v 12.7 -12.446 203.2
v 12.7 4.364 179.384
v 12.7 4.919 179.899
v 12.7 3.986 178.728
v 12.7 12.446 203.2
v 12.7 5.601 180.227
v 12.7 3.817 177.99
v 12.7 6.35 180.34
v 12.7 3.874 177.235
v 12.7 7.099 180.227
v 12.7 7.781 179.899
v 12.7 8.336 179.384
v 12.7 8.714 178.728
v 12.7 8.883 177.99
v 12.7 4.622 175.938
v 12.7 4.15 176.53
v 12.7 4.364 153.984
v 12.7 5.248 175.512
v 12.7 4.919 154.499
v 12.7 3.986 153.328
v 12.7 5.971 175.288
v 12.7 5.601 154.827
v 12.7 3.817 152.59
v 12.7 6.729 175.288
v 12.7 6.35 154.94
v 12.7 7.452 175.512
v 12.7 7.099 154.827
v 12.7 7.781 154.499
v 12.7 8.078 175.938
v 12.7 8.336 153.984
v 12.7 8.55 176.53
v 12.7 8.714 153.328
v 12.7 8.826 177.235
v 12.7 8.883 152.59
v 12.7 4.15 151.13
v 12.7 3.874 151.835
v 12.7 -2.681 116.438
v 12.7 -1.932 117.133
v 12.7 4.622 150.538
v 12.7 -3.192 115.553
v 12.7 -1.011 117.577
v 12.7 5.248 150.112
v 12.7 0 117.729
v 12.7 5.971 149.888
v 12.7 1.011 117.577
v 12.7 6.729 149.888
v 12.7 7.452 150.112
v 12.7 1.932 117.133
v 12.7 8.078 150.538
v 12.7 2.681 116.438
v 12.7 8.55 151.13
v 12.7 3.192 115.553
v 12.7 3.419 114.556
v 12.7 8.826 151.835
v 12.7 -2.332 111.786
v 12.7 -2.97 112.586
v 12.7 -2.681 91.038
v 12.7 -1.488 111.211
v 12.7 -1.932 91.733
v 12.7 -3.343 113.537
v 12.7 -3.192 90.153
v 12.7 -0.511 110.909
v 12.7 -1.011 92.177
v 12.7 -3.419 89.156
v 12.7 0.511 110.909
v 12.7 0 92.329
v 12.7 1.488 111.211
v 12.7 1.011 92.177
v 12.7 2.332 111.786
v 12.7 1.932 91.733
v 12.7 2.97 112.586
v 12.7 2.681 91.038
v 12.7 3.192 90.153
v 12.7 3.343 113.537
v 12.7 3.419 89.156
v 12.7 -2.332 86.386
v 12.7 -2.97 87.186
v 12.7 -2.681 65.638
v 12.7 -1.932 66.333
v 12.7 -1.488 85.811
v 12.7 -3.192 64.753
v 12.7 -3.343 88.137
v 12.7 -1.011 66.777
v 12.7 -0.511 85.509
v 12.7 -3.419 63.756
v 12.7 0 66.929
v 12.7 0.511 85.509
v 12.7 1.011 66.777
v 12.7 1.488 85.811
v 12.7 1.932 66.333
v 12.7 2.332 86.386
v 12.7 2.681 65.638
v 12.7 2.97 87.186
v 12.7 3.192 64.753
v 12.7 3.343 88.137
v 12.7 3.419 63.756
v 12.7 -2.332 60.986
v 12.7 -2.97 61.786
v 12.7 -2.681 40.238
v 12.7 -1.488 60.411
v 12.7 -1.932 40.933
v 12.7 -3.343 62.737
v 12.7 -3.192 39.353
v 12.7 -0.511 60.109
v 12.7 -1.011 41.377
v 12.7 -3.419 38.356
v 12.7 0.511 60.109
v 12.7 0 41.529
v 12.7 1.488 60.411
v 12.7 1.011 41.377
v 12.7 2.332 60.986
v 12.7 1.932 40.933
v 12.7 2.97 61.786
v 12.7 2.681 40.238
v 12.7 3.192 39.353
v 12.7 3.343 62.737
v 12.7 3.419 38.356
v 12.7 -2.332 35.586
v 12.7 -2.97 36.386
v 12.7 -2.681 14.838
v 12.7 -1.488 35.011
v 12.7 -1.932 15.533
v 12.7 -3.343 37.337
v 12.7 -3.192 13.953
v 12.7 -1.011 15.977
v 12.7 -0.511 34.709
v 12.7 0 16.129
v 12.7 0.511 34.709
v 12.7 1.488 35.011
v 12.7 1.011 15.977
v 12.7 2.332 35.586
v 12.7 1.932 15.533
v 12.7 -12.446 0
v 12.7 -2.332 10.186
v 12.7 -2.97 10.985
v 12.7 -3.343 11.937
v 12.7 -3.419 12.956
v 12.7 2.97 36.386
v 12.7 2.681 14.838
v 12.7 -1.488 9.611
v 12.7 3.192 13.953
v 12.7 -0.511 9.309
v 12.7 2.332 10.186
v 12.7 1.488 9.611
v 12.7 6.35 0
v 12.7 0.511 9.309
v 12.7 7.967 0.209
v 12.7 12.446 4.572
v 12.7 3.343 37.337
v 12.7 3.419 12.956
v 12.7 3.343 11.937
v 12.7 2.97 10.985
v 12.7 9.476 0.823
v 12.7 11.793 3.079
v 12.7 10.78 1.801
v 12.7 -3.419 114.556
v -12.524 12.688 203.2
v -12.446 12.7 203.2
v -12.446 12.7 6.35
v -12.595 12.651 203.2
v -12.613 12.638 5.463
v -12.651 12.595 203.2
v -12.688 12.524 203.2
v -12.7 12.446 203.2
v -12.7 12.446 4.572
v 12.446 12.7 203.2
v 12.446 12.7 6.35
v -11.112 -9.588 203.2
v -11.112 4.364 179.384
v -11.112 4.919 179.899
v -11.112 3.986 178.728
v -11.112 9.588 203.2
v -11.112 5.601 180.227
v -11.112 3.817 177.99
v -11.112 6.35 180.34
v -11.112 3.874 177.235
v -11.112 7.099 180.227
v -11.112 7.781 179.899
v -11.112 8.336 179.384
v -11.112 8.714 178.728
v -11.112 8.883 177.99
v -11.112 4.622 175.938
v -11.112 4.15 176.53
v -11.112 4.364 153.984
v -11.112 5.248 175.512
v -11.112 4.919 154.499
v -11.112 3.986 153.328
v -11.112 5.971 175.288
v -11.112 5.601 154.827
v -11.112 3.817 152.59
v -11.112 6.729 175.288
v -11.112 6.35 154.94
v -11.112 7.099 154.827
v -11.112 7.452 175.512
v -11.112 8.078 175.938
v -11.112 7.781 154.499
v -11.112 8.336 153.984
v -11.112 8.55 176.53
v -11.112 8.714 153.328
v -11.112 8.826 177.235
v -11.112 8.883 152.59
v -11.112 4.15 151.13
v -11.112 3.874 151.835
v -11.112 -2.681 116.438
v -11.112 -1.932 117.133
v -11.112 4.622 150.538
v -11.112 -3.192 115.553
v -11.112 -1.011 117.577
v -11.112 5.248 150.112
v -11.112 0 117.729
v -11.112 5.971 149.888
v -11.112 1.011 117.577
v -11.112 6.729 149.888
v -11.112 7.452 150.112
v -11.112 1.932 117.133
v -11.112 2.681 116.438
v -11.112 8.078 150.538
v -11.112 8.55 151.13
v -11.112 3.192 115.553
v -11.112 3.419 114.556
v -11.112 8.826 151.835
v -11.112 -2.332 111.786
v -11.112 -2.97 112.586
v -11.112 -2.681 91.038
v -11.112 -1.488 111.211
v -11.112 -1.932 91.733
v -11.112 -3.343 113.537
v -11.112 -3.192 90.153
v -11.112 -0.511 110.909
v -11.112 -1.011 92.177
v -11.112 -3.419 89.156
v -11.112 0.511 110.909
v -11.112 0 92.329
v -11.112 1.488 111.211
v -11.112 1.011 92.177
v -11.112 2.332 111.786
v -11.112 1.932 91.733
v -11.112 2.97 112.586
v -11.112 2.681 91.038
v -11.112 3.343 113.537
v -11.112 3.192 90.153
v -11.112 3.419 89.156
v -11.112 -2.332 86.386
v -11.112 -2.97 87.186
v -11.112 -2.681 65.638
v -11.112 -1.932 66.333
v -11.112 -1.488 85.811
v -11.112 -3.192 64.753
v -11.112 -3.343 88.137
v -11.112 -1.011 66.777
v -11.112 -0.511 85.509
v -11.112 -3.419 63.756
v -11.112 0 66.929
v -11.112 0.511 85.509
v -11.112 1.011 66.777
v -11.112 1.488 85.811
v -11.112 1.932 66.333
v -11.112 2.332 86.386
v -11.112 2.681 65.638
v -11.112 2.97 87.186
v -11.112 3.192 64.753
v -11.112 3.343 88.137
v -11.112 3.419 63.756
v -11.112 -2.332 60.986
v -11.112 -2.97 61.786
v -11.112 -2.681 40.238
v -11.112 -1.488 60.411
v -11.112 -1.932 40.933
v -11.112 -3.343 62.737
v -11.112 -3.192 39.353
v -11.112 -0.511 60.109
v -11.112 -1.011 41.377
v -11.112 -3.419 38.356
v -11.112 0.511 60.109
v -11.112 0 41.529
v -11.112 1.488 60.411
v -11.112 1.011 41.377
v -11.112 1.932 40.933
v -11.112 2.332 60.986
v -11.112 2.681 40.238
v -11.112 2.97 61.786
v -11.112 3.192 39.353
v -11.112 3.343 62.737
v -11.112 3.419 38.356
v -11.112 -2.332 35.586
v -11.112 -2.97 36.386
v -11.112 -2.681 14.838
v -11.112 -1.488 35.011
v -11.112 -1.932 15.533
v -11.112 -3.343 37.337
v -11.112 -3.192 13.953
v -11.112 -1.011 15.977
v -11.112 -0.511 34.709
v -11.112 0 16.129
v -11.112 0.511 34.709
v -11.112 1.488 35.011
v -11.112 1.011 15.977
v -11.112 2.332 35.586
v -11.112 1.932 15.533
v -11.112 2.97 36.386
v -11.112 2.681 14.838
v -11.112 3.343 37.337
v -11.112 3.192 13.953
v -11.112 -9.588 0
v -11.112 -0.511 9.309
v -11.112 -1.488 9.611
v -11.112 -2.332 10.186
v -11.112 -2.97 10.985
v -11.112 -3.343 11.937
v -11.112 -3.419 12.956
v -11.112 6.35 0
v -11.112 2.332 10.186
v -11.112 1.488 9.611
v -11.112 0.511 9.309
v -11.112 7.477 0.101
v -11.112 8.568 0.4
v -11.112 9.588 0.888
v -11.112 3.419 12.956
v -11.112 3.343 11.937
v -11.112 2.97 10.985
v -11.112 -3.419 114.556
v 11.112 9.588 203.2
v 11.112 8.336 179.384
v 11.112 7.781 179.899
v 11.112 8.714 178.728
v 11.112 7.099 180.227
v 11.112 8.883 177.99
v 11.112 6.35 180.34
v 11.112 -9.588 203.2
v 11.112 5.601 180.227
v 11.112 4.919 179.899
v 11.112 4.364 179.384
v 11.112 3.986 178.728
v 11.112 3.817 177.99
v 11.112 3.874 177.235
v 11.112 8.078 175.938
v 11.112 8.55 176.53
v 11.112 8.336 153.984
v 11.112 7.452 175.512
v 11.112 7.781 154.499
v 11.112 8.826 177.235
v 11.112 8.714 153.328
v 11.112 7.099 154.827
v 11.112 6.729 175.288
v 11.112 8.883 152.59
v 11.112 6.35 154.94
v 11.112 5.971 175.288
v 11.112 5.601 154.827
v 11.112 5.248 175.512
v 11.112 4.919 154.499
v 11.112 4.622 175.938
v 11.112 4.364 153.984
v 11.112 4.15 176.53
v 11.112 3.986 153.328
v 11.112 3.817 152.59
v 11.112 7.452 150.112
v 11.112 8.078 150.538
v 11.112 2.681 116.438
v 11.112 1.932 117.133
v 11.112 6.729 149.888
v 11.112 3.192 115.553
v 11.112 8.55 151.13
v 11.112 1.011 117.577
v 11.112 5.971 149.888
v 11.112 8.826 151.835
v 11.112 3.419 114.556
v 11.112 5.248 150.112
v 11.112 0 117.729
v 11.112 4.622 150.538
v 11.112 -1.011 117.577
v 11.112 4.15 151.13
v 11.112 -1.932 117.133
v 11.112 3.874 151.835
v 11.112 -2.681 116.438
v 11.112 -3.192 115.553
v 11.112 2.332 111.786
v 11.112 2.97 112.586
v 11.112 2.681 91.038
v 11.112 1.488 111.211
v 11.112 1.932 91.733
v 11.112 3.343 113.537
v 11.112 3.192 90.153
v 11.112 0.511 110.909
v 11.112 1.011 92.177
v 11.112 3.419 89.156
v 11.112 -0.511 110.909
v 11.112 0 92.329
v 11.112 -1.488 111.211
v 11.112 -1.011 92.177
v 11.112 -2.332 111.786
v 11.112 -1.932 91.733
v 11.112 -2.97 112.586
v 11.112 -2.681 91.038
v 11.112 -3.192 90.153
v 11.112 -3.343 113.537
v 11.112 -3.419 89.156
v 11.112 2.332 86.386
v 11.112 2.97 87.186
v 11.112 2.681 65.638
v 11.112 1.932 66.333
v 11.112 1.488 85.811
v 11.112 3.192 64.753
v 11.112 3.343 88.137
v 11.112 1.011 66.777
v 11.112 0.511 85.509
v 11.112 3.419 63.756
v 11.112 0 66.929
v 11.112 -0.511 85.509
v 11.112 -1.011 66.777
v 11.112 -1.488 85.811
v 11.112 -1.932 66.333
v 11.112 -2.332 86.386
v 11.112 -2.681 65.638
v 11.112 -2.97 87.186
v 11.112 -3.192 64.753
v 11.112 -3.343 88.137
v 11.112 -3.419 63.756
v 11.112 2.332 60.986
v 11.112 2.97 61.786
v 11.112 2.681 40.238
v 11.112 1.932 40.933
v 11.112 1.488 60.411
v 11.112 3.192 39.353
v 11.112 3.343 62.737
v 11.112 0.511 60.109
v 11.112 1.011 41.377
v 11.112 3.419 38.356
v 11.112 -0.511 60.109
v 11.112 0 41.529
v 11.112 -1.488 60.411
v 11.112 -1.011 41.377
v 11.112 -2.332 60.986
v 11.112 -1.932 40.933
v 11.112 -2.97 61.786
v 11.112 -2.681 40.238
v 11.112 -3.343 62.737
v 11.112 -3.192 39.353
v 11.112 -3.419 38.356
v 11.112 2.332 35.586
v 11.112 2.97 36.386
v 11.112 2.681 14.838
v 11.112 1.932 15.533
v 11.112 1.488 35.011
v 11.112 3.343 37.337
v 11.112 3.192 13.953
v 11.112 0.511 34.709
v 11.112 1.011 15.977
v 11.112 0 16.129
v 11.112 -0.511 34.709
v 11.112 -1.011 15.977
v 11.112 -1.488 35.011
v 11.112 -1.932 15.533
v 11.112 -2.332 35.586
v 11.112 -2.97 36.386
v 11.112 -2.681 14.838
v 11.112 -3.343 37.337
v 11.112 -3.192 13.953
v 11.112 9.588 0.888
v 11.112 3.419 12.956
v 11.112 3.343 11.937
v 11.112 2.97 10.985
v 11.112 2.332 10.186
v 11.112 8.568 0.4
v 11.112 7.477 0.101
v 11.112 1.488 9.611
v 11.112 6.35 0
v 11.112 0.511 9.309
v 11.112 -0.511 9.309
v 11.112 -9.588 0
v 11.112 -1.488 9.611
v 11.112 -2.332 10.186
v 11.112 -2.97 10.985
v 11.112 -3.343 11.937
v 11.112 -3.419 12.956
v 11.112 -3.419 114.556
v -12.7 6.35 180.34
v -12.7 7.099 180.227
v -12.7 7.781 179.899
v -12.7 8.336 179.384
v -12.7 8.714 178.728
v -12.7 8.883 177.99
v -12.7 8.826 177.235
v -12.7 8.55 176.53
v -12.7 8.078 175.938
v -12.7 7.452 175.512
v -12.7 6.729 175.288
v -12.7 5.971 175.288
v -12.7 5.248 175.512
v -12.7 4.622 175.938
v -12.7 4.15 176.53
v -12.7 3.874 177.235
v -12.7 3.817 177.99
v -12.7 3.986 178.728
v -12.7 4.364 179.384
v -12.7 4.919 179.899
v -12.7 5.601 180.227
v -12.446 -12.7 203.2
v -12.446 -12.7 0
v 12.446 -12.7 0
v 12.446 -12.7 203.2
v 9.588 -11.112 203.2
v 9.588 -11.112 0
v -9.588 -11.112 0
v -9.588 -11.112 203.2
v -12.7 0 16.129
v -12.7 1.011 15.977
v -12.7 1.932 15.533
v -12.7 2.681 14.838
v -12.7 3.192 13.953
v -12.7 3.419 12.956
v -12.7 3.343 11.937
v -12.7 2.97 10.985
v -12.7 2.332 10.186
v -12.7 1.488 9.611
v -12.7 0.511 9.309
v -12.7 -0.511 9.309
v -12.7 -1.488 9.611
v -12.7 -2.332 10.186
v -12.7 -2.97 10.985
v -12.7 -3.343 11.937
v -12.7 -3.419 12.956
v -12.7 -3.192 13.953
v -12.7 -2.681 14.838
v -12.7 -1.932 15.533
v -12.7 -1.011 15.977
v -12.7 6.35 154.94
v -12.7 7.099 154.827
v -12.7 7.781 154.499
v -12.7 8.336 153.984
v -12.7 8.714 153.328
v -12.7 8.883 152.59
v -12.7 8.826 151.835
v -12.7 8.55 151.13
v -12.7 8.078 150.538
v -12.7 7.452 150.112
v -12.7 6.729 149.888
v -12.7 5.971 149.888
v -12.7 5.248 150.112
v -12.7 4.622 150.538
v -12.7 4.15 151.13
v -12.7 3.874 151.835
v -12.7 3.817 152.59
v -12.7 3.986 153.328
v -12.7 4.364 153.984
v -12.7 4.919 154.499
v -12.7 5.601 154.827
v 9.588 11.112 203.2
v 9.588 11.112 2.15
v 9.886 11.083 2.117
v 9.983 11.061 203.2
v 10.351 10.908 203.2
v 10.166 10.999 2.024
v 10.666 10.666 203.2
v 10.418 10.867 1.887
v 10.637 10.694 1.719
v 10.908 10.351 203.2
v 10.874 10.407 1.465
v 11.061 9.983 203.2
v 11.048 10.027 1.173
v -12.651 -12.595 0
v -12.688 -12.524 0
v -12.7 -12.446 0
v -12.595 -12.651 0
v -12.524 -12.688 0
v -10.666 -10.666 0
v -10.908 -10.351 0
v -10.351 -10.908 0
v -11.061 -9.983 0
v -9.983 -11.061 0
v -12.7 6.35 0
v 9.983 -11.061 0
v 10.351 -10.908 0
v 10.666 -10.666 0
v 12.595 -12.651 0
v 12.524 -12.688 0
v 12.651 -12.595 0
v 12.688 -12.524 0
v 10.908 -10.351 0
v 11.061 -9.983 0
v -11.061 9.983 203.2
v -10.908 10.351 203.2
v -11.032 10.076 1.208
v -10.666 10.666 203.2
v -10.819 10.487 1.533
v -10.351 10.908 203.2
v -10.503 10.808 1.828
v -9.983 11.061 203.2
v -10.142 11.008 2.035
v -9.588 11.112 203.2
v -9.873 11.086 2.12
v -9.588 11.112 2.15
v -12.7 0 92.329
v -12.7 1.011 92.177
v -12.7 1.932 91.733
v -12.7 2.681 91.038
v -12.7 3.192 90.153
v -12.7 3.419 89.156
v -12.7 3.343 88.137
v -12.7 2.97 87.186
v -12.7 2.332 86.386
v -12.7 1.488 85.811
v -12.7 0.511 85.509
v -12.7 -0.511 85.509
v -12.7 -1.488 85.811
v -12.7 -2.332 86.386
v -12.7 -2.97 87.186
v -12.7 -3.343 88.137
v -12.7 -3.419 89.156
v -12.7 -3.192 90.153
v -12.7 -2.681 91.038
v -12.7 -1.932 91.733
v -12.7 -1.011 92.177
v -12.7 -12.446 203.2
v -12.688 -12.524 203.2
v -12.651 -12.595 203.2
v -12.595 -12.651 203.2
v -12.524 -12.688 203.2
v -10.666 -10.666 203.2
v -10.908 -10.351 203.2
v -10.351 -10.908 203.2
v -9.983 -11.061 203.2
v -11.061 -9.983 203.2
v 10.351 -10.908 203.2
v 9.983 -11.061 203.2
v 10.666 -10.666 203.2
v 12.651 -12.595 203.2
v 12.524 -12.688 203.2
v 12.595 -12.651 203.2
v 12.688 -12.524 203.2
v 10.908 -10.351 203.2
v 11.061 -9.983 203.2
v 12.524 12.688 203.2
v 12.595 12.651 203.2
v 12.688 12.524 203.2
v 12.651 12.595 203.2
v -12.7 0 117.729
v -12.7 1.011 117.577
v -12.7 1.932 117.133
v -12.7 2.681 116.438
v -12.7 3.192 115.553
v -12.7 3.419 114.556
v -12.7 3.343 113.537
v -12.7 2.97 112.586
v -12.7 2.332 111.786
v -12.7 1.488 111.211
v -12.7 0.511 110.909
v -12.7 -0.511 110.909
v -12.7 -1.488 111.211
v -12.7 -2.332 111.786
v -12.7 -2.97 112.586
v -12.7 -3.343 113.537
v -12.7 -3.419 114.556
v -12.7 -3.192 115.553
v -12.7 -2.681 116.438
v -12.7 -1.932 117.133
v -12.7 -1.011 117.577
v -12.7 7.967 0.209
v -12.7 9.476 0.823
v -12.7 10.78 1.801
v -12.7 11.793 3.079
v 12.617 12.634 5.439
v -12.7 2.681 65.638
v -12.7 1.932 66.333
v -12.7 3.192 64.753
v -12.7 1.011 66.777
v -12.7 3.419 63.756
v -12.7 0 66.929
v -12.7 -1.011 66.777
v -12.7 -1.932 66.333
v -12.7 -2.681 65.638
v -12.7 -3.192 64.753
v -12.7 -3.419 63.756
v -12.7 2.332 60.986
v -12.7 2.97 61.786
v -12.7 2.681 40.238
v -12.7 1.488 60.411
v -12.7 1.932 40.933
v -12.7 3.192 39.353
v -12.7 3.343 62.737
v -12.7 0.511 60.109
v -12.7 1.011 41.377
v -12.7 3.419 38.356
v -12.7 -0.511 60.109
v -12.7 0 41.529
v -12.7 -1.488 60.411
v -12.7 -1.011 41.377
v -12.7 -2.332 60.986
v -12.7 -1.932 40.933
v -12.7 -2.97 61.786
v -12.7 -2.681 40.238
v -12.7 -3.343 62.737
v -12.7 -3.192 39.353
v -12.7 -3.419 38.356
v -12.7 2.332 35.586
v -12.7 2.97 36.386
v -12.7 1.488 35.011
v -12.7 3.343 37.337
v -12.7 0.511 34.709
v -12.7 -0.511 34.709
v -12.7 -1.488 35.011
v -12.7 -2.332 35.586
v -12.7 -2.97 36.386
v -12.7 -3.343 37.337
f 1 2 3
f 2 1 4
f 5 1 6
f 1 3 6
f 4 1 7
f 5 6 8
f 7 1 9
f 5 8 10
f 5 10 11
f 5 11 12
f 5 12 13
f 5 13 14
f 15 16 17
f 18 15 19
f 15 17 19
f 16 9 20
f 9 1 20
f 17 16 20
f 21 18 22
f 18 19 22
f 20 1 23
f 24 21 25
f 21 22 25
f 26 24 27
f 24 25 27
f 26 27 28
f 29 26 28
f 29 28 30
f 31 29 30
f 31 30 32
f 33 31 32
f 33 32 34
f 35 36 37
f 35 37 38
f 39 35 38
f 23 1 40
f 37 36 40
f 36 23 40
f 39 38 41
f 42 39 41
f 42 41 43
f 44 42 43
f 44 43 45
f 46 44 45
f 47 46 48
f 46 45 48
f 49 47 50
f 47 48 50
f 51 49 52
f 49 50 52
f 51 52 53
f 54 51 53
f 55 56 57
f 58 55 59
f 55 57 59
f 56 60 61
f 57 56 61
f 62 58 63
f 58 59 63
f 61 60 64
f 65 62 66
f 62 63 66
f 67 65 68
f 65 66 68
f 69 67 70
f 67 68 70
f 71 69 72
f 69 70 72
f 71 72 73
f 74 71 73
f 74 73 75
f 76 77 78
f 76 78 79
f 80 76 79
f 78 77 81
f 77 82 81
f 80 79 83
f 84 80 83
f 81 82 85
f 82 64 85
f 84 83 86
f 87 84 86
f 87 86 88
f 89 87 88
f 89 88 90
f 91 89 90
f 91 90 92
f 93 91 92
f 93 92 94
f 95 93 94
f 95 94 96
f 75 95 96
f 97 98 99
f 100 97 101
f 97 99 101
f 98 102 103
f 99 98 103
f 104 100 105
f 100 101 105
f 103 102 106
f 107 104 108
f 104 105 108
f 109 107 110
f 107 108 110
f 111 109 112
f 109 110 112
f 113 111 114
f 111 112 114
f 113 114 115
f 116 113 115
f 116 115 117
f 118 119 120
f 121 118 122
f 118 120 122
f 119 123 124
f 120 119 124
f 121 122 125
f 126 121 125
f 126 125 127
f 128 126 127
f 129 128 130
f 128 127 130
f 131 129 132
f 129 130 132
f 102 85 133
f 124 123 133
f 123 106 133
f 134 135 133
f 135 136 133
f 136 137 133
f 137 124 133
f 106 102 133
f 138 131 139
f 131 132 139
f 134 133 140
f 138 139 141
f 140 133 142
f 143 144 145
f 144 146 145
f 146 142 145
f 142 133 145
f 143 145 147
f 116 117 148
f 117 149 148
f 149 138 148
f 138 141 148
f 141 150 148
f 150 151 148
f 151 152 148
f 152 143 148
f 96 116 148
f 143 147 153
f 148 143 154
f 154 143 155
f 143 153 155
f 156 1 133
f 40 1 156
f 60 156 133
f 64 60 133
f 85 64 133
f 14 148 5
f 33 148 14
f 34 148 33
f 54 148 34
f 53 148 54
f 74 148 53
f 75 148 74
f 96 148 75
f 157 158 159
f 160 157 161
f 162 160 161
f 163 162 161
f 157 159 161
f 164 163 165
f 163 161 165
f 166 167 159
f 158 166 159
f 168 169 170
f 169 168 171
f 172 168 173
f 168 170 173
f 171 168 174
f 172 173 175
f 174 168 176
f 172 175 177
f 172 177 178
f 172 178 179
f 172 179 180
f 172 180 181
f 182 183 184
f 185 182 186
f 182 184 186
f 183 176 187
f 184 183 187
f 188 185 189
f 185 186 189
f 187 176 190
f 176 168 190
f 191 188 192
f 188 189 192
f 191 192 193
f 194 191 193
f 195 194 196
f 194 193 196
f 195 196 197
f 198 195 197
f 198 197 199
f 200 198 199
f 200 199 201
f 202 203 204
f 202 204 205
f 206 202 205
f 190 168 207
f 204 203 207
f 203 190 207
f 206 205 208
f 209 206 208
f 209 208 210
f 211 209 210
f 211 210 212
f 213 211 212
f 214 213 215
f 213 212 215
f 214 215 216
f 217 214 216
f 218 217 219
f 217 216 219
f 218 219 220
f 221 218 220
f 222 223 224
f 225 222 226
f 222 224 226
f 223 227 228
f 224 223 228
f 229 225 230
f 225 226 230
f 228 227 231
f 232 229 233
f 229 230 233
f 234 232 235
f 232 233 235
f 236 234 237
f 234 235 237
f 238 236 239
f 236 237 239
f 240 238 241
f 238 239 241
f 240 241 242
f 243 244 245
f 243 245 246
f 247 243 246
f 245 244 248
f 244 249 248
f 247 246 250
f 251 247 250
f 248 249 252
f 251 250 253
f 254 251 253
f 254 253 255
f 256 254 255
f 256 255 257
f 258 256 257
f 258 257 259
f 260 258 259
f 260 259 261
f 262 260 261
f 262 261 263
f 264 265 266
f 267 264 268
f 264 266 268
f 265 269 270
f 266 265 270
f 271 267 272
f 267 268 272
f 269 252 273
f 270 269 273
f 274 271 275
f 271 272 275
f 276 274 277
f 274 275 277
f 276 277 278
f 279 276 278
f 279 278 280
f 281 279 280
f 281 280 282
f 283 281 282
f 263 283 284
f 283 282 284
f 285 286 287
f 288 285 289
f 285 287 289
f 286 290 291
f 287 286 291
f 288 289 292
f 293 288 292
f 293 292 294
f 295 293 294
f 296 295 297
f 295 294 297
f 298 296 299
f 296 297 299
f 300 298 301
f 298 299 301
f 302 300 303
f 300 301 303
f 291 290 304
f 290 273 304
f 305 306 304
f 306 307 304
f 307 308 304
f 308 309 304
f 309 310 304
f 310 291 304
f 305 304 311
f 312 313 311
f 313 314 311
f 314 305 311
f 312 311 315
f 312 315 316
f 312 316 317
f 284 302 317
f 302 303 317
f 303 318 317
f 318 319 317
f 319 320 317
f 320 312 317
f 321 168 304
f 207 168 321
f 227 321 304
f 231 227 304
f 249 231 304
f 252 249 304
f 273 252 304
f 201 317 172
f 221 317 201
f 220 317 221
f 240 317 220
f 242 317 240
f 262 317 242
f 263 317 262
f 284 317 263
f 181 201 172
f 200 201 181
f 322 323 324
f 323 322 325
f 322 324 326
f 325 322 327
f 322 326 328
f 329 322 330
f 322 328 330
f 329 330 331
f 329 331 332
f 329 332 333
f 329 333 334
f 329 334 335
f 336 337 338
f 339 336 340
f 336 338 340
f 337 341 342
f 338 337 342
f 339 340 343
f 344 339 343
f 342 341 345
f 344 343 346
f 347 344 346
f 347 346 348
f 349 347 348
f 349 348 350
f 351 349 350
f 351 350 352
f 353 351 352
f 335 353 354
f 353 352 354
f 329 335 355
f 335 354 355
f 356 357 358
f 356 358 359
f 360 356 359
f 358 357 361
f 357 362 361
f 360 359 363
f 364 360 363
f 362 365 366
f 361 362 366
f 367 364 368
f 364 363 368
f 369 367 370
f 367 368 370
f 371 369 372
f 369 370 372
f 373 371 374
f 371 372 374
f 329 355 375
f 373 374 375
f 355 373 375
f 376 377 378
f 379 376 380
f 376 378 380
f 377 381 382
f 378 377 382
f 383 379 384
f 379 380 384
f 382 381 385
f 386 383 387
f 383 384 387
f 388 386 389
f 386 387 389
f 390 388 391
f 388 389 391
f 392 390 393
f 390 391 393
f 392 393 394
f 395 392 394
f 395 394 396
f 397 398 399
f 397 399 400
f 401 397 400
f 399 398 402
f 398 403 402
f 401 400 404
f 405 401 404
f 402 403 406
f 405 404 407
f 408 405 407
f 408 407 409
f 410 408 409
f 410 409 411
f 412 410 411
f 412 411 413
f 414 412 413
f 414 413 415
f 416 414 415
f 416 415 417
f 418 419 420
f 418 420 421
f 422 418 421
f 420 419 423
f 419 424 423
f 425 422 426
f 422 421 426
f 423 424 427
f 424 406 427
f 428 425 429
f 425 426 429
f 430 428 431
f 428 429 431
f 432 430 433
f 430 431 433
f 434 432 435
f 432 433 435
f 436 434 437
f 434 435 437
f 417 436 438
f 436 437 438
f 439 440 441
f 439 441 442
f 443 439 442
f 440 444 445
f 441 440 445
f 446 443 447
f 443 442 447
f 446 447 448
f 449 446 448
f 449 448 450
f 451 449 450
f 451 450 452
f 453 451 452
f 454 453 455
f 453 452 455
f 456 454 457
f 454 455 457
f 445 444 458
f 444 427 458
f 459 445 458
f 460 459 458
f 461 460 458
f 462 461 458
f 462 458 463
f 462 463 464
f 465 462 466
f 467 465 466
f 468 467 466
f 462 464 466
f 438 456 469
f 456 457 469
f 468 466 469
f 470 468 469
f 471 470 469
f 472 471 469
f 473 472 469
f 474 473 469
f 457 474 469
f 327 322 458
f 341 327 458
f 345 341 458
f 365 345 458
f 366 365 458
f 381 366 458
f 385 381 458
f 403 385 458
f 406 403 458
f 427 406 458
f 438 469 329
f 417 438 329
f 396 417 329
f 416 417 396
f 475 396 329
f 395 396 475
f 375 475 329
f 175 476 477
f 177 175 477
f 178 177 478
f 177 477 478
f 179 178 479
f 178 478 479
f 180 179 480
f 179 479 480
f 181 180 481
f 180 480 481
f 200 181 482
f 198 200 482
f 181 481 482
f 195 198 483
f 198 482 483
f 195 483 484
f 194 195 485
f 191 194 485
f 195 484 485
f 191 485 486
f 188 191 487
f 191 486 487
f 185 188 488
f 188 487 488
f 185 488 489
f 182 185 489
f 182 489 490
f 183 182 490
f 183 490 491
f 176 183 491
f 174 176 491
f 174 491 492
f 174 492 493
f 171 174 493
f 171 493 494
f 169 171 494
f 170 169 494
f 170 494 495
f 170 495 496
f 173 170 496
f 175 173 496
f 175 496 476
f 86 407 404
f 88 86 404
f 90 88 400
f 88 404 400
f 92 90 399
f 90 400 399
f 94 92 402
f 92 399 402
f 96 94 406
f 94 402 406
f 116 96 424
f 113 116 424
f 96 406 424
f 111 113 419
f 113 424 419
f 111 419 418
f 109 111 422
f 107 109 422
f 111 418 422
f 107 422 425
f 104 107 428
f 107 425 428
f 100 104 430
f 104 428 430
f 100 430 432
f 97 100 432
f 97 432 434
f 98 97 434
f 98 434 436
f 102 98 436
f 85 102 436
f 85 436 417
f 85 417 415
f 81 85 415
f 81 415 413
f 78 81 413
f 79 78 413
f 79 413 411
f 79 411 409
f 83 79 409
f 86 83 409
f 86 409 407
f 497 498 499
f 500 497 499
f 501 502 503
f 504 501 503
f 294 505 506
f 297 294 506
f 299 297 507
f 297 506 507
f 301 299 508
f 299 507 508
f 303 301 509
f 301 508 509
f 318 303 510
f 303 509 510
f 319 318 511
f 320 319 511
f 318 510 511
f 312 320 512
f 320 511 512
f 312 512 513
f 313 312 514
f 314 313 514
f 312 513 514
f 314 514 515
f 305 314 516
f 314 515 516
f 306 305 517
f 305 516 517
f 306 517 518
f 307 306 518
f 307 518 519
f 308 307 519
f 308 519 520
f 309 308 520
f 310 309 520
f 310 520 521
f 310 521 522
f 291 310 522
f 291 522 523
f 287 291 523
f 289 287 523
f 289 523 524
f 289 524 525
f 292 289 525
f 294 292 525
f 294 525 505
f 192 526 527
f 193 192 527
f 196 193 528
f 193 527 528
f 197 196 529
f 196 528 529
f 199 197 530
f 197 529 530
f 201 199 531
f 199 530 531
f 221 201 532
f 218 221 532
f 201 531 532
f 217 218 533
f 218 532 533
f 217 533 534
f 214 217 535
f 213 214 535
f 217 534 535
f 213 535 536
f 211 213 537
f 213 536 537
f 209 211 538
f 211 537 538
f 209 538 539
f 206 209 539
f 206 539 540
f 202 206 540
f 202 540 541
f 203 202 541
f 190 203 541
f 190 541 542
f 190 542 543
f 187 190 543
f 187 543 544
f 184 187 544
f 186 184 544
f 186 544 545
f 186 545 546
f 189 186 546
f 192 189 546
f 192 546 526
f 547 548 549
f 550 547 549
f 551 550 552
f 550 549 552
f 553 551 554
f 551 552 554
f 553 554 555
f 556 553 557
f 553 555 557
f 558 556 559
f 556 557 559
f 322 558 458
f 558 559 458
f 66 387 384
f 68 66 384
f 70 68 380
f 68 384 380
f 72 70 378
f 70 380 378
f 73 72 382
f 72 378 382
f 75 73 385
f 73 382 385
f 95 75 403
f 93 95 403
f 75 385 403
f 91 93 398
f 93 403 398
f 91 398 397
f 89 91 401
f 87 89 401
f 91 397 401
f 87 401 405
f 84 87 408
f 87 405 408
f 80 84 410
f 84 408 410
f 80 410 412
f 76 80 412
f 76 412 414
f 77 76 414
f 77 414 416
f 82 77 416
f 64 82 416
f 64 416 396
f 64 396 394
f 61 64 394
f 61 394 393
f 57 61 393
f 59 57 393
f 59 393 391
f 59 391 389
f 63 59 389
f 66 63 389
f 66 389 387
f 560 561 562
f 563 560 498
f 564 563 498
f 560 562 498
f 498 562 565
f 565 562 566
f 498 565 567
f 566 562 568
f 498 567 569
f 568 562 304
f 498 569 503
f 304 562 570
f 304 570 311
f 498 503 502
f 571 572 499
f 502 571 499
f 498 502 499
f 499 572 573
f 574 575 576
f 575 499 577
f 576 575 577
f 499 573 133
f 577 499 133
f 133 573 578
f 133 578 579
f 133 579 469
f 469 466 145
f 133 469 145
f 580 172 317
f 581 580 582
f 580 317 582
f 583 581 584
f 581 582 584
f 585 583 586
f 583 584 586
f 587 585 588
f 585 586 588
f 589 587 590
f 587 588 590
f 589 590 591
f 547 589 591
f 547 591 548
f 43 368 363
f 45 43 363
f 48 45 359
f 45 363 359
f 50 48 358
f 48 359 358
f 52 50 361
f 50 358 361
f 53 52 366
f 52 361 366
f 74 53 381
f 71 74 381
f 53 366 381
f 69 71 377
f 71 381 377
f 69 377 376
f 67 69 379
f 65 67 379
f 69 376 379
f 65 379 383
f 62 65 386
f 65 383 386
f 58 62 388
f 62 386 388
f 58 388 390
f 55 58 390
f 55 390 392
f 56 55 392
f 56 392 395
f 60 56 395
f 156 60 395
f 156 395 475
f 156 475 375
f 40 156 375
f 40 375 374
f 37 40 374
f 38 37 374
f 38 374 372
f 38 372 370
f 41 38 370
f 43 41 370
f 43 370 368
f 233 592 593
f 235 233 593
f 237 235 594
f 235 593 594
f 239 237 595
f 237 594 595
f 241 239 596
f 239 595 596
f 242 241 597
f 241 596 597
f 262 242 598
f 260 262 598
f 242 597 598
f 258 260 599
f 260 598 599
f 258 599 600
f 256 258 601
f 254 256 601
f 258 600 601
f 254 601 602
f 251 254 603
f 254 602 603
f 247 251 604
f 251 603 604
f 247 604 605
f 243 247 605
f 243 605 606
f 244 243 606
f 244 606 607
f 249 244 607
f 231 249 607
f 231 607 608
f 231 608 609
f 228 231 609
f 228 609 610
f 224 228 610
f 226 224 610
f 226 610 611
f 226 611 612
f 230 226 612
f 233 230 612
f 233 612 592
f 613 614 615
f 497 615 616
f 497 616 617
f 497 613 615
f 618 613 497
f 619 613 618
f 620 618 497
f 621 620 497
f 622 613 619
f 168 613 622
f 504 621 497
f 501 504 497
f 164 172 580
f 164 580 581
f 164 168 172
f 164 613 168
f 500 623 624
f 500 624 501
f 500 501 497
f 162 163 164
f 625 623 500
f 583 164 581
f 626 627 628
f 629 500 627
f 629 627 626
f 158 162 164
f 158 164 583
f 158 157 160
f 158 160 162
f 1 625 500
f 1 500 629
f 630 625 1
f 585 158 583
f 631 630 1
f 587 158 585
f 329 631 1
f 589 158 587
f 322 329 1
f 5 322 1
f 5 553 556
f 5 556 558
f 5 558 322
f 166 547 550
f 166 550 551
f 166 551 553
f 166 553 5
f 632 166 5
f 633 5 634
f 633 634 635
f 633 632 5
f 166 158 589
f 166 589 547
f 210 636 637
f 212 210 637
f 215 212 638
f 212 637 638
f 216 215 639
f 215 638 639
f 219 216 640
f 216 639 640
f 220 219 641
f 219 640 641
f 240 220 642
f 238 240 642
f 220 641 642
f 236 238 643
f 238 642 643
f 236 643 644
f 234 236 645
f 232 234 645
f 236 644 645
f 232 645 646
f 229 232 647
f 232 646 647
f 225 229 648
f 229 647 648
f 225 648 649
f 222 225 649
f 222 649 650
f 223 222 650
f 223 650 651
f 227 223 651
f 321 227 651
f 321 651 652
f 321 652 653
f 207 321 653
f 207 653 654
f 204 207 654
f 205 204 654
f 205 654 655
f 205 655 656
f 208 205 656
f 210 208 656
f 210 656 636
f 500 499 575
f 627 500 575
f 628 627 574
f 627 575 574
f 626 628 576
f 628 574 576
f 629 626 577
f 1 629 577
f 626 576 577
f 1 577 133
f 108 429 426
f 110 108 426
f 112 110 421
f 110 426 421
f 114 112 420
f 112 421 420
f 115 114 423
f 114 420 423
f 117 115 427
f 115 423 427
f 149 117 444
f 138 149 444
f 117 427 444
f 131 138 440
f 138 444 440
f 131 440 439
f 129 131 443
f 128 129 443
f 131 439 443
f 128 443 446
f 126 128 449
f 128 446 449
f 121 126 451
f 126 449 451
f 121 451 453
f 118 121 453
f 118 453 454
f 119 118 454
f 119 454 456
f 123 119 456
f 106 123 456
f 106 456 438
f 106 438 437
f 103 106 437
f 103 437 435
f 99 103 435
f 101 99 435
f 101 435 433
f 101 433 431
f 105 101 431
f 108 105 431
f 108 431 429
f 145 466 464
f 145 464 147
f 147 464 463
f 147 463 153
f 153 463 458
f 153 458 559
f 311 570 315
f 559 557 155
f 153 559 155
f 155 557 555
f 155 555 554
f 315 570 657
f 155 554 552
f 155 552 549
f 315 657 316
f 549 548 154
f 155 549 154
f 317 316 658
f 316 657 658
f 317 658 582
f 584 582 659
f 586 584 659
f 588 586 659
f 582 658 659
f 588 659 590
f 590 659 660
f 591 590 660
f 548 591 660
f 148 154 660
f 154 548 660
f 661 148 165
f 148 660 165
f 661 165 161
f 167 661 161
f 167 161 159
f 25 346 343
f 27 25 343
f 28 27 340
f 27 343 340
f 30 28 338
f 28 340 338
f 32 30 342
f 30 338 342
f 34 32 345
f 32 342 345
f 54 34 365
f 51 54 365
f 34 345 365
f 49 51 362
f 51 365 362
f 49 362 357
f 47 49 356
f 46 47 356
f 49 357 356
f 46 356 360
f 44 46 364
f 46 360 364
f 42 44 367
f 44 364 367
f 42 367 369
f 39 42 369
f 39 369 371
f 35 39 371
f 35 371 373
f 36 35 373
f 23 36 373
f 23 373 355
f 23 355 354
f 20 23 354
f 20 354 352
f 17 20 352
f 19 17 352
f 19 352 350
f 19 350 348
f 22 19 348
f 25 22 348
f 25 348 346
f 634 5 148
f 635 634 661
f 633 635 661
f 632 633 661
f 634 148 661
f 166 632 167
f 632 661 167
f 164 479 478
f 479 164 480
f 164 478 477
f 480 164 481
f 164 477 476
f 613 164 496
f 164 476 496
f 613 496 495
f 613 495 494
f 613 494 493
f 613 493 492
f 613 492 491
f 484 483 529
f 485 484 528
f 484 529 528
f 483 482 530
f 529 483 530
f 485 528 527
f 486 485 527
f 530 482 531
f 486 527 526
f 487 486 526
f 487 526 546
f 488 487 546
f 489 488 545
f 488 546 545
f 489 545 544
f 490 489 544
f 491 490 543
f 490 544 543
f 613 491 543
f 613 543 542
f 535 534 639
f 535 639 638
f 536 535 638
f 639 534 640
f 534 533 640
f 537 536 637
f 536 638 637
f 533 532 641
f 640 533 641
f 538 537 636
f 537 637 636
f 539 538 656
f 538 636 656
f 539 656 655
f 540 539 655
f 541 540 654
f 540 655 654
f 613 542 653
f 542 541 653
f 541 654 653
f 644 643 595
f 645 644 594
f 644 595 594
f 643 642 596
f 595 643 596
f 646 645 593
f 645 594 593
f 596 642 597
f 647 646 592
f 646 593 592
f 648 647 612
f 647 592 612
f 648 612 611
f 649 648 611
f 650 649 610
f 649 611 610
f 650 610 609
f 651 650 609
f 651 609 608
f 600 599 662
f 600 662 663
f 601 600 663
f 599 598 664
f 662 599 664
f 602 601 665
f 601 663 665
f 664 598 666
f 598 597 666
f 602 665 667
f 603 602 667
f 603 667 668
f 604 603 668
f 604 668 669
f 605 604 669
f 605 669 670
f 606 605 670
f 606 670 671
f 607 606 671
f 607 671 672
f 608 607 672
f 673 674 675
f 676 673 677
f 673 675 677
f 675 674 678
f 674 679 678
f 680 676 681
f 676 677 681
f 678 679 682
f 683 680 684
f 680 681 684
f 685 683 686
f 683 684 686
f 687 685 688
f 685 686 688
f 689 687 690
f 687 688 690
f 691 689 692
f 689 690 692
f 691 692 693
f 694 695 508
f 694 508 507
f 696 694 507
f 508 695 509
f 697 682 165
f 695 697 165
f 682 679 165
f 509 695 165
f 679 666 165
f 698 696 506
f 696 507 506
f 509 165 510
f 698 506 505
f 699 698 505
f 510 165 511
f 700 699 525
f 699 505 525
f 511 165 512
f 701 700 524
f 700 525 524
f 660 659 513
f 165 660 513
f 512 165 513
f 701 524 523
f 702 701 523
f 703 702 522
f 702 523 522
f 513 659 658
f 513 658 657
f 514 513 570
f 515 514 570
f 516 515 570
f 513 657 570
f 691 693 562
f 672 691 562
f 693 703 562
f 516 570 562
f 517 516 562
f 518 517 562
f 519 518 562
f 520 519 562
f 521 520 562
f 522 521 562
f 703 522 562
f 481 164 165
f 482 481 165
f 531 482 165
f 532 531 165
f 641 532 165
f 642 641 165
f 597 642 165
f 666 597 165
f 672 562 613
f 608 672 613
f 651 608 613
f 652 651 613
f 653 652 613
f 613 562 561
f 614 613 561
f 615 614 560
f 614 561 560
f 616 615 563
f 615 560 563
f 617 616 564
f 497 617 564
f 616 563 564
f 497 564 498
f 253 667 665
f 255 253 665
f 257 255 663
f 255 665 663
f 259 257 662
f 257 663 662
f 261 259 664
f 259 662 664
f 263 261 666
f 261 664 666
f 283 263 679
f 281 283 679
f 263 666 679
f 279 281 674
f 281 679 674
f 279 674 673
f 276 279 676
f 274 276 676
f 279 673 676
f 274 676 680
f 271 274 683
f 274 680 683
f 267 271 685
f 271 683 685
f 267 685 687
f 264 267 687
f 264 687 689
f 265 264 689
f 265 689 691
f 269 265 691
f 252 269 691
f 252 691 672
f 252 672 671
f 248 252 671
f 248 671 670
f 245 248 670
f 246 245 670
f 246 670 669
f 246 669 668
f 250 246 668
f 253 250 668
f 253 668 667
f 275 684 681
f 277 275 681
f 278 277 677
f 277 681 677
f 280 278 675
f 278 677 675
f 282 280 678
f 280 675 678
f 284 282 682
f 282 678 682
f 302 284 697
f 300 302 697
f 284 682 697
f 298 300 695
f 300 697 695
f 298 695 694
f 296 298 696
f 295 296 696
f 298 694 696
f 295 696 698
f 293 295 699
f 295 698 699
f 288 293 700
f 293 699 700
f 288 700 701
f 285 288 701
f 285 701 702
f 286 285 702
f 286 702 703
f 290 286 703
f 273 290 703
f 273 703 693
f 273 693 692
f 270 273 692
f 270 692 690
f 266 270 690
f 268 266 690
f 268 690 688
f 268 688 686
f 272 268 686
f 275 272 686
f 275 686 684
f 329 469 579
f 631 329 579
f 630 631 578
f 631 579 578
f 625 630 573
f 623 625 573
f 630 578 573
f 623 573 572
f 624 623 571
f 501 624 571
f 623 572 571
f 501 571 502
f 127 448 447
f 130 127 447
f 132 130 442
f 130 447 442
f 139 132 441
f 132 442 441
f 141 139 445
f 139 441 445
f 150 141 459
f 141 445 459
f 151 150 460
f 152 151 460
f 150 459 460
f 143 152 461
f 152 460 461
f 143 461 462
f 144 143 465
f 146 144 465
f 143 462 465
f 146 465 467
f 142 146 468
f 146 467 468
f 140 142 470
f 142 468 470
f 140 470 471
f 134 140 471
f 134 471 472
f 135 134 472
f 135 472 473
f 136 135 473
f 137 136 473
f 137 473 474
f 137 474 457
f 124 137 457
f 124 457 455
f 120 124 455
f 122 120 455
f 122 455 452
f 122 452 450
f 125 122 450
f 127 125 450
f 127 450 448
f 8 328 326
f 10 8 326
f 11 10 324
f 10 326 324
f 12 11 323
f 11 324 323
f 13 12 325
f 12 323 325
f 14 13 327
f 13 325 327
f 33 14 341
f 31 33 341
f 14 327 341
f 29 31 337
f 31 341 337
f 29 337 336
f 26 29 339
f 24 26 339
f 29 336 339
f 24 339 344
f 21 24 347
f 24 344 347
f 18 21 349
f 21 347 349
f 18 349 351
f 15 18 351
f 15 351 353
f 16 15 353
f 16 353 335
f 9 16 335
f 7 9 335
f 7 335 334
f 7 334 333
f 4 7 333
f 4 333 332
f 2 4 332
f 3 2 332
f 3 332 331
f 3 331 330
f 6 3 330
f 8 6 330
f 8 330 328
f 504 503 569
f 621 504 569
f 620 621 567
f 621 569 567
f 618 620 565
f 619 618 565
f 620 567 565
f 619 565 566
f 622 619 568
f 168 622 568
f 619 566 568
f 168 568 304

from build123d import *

# Parameters (mm, degrees)
BOSS_EXTRUDE1_DEPTH = 203.2
SKETCH2_R           = 3.429
SKETCH2_R_2         = 2.54
CUT_EXTRUDE1_DEPTH  = 26.4


with BuildPart() as part:
    # Sketch1 → Boss-Extrude1 (new body)
    with BuildSketch(Plane.XY):
        with BuildLine():
            Line((-12.446, -12.7), (12.446, -12.7))
            ThreePointArc((12.446, -12.7), (12.625605122, -12.625605122), (12.7, -12.446))
            Line((12.7, -12.446), (12.7, 12.446))
            ThreePointArc((12.7, 12.446), (12.625605122, 12.625605122), (12.446, 12.7))
            Line((12.446, 12.7), (-12.446, 12.7))
            ThreePointArc((-12.446, 12.7), (-12.625605122, 12.625605122), (-12.7, 12.446))
            Line((-12.7, 12.446), (-12.7, -12.446))
            ThreePointArc((-12.7, -12.446), (-12.625605122, -12.625605122), (-12.446, -12.7))
        make_face()
        with BuildLine():
            Line((-9.5885, 11.1125), (9.5885, 11.1125))
            ThreePointArc((9.5885, 11.1125), (10.666130735, 10.666130735), (11.1125, 9.5885))
            Line((11.1125, 9.5885), (11.1125, -9.5885))
            ThreePointArc((11.1125, -9.5885), (10.666130735, -10.666130735), (9.5885, -11.1125))
            Line((9.5885, -11.1125), (-9.5885, -11.1125))
            ThreePointArc((-9.5885, -11.1125), (-10.666130735, -10.666130735), (-11.1125, -9.5885))
            Line((-11.1125, -9.5885), (-11.1125, 9.5885))
            ThreePointArc((-11.1125, 9.5885), (-10.666130735, 10.666130735), (-9.5885, 11.1125))
        make_face(mode=Mode.SUBTRACT)
    extrude(amount=BOSS_EXTRUDE1_DEPTH)

    # Sketch2 → Cut-Extrude1 (cut, through all)
    with BuildSketch(Plane.ZY.offset(12.7)):
        with Locations((12.7, 0)):
            Circle(SKETCH2_R)
        with Locations((38.1, 0)):
            Circle(SKETCH2_R)
        with Locations((63.5, 0)):
            Circle(SKETCH2_R)
        with Locations((88.9, 0)):
            Circle(SKETCH2_R)
        with Locations((114.3, 0)):
            Circle(SKETCH2_R)
        with Locations((177.8, 6.35)):
            Circle(SKETCH2_R_2)
        with Locations((152.4, 6.35)):
            Circle(SKETCH2_R_2)
        with BuildLine():
            Line((6.35, 12.7), (0, 12.7))
            Line((0, 12.7), (0, 6.35))
            ThreePointArc((0, 6.35), (1.859871939, 10.840128061), (6.35, 12.7))
        make_face()
    extrude(amount=-CUT_EXTRUDE1_DEPTH, mode=Mode.SUBTRACT)


solid = part.part
